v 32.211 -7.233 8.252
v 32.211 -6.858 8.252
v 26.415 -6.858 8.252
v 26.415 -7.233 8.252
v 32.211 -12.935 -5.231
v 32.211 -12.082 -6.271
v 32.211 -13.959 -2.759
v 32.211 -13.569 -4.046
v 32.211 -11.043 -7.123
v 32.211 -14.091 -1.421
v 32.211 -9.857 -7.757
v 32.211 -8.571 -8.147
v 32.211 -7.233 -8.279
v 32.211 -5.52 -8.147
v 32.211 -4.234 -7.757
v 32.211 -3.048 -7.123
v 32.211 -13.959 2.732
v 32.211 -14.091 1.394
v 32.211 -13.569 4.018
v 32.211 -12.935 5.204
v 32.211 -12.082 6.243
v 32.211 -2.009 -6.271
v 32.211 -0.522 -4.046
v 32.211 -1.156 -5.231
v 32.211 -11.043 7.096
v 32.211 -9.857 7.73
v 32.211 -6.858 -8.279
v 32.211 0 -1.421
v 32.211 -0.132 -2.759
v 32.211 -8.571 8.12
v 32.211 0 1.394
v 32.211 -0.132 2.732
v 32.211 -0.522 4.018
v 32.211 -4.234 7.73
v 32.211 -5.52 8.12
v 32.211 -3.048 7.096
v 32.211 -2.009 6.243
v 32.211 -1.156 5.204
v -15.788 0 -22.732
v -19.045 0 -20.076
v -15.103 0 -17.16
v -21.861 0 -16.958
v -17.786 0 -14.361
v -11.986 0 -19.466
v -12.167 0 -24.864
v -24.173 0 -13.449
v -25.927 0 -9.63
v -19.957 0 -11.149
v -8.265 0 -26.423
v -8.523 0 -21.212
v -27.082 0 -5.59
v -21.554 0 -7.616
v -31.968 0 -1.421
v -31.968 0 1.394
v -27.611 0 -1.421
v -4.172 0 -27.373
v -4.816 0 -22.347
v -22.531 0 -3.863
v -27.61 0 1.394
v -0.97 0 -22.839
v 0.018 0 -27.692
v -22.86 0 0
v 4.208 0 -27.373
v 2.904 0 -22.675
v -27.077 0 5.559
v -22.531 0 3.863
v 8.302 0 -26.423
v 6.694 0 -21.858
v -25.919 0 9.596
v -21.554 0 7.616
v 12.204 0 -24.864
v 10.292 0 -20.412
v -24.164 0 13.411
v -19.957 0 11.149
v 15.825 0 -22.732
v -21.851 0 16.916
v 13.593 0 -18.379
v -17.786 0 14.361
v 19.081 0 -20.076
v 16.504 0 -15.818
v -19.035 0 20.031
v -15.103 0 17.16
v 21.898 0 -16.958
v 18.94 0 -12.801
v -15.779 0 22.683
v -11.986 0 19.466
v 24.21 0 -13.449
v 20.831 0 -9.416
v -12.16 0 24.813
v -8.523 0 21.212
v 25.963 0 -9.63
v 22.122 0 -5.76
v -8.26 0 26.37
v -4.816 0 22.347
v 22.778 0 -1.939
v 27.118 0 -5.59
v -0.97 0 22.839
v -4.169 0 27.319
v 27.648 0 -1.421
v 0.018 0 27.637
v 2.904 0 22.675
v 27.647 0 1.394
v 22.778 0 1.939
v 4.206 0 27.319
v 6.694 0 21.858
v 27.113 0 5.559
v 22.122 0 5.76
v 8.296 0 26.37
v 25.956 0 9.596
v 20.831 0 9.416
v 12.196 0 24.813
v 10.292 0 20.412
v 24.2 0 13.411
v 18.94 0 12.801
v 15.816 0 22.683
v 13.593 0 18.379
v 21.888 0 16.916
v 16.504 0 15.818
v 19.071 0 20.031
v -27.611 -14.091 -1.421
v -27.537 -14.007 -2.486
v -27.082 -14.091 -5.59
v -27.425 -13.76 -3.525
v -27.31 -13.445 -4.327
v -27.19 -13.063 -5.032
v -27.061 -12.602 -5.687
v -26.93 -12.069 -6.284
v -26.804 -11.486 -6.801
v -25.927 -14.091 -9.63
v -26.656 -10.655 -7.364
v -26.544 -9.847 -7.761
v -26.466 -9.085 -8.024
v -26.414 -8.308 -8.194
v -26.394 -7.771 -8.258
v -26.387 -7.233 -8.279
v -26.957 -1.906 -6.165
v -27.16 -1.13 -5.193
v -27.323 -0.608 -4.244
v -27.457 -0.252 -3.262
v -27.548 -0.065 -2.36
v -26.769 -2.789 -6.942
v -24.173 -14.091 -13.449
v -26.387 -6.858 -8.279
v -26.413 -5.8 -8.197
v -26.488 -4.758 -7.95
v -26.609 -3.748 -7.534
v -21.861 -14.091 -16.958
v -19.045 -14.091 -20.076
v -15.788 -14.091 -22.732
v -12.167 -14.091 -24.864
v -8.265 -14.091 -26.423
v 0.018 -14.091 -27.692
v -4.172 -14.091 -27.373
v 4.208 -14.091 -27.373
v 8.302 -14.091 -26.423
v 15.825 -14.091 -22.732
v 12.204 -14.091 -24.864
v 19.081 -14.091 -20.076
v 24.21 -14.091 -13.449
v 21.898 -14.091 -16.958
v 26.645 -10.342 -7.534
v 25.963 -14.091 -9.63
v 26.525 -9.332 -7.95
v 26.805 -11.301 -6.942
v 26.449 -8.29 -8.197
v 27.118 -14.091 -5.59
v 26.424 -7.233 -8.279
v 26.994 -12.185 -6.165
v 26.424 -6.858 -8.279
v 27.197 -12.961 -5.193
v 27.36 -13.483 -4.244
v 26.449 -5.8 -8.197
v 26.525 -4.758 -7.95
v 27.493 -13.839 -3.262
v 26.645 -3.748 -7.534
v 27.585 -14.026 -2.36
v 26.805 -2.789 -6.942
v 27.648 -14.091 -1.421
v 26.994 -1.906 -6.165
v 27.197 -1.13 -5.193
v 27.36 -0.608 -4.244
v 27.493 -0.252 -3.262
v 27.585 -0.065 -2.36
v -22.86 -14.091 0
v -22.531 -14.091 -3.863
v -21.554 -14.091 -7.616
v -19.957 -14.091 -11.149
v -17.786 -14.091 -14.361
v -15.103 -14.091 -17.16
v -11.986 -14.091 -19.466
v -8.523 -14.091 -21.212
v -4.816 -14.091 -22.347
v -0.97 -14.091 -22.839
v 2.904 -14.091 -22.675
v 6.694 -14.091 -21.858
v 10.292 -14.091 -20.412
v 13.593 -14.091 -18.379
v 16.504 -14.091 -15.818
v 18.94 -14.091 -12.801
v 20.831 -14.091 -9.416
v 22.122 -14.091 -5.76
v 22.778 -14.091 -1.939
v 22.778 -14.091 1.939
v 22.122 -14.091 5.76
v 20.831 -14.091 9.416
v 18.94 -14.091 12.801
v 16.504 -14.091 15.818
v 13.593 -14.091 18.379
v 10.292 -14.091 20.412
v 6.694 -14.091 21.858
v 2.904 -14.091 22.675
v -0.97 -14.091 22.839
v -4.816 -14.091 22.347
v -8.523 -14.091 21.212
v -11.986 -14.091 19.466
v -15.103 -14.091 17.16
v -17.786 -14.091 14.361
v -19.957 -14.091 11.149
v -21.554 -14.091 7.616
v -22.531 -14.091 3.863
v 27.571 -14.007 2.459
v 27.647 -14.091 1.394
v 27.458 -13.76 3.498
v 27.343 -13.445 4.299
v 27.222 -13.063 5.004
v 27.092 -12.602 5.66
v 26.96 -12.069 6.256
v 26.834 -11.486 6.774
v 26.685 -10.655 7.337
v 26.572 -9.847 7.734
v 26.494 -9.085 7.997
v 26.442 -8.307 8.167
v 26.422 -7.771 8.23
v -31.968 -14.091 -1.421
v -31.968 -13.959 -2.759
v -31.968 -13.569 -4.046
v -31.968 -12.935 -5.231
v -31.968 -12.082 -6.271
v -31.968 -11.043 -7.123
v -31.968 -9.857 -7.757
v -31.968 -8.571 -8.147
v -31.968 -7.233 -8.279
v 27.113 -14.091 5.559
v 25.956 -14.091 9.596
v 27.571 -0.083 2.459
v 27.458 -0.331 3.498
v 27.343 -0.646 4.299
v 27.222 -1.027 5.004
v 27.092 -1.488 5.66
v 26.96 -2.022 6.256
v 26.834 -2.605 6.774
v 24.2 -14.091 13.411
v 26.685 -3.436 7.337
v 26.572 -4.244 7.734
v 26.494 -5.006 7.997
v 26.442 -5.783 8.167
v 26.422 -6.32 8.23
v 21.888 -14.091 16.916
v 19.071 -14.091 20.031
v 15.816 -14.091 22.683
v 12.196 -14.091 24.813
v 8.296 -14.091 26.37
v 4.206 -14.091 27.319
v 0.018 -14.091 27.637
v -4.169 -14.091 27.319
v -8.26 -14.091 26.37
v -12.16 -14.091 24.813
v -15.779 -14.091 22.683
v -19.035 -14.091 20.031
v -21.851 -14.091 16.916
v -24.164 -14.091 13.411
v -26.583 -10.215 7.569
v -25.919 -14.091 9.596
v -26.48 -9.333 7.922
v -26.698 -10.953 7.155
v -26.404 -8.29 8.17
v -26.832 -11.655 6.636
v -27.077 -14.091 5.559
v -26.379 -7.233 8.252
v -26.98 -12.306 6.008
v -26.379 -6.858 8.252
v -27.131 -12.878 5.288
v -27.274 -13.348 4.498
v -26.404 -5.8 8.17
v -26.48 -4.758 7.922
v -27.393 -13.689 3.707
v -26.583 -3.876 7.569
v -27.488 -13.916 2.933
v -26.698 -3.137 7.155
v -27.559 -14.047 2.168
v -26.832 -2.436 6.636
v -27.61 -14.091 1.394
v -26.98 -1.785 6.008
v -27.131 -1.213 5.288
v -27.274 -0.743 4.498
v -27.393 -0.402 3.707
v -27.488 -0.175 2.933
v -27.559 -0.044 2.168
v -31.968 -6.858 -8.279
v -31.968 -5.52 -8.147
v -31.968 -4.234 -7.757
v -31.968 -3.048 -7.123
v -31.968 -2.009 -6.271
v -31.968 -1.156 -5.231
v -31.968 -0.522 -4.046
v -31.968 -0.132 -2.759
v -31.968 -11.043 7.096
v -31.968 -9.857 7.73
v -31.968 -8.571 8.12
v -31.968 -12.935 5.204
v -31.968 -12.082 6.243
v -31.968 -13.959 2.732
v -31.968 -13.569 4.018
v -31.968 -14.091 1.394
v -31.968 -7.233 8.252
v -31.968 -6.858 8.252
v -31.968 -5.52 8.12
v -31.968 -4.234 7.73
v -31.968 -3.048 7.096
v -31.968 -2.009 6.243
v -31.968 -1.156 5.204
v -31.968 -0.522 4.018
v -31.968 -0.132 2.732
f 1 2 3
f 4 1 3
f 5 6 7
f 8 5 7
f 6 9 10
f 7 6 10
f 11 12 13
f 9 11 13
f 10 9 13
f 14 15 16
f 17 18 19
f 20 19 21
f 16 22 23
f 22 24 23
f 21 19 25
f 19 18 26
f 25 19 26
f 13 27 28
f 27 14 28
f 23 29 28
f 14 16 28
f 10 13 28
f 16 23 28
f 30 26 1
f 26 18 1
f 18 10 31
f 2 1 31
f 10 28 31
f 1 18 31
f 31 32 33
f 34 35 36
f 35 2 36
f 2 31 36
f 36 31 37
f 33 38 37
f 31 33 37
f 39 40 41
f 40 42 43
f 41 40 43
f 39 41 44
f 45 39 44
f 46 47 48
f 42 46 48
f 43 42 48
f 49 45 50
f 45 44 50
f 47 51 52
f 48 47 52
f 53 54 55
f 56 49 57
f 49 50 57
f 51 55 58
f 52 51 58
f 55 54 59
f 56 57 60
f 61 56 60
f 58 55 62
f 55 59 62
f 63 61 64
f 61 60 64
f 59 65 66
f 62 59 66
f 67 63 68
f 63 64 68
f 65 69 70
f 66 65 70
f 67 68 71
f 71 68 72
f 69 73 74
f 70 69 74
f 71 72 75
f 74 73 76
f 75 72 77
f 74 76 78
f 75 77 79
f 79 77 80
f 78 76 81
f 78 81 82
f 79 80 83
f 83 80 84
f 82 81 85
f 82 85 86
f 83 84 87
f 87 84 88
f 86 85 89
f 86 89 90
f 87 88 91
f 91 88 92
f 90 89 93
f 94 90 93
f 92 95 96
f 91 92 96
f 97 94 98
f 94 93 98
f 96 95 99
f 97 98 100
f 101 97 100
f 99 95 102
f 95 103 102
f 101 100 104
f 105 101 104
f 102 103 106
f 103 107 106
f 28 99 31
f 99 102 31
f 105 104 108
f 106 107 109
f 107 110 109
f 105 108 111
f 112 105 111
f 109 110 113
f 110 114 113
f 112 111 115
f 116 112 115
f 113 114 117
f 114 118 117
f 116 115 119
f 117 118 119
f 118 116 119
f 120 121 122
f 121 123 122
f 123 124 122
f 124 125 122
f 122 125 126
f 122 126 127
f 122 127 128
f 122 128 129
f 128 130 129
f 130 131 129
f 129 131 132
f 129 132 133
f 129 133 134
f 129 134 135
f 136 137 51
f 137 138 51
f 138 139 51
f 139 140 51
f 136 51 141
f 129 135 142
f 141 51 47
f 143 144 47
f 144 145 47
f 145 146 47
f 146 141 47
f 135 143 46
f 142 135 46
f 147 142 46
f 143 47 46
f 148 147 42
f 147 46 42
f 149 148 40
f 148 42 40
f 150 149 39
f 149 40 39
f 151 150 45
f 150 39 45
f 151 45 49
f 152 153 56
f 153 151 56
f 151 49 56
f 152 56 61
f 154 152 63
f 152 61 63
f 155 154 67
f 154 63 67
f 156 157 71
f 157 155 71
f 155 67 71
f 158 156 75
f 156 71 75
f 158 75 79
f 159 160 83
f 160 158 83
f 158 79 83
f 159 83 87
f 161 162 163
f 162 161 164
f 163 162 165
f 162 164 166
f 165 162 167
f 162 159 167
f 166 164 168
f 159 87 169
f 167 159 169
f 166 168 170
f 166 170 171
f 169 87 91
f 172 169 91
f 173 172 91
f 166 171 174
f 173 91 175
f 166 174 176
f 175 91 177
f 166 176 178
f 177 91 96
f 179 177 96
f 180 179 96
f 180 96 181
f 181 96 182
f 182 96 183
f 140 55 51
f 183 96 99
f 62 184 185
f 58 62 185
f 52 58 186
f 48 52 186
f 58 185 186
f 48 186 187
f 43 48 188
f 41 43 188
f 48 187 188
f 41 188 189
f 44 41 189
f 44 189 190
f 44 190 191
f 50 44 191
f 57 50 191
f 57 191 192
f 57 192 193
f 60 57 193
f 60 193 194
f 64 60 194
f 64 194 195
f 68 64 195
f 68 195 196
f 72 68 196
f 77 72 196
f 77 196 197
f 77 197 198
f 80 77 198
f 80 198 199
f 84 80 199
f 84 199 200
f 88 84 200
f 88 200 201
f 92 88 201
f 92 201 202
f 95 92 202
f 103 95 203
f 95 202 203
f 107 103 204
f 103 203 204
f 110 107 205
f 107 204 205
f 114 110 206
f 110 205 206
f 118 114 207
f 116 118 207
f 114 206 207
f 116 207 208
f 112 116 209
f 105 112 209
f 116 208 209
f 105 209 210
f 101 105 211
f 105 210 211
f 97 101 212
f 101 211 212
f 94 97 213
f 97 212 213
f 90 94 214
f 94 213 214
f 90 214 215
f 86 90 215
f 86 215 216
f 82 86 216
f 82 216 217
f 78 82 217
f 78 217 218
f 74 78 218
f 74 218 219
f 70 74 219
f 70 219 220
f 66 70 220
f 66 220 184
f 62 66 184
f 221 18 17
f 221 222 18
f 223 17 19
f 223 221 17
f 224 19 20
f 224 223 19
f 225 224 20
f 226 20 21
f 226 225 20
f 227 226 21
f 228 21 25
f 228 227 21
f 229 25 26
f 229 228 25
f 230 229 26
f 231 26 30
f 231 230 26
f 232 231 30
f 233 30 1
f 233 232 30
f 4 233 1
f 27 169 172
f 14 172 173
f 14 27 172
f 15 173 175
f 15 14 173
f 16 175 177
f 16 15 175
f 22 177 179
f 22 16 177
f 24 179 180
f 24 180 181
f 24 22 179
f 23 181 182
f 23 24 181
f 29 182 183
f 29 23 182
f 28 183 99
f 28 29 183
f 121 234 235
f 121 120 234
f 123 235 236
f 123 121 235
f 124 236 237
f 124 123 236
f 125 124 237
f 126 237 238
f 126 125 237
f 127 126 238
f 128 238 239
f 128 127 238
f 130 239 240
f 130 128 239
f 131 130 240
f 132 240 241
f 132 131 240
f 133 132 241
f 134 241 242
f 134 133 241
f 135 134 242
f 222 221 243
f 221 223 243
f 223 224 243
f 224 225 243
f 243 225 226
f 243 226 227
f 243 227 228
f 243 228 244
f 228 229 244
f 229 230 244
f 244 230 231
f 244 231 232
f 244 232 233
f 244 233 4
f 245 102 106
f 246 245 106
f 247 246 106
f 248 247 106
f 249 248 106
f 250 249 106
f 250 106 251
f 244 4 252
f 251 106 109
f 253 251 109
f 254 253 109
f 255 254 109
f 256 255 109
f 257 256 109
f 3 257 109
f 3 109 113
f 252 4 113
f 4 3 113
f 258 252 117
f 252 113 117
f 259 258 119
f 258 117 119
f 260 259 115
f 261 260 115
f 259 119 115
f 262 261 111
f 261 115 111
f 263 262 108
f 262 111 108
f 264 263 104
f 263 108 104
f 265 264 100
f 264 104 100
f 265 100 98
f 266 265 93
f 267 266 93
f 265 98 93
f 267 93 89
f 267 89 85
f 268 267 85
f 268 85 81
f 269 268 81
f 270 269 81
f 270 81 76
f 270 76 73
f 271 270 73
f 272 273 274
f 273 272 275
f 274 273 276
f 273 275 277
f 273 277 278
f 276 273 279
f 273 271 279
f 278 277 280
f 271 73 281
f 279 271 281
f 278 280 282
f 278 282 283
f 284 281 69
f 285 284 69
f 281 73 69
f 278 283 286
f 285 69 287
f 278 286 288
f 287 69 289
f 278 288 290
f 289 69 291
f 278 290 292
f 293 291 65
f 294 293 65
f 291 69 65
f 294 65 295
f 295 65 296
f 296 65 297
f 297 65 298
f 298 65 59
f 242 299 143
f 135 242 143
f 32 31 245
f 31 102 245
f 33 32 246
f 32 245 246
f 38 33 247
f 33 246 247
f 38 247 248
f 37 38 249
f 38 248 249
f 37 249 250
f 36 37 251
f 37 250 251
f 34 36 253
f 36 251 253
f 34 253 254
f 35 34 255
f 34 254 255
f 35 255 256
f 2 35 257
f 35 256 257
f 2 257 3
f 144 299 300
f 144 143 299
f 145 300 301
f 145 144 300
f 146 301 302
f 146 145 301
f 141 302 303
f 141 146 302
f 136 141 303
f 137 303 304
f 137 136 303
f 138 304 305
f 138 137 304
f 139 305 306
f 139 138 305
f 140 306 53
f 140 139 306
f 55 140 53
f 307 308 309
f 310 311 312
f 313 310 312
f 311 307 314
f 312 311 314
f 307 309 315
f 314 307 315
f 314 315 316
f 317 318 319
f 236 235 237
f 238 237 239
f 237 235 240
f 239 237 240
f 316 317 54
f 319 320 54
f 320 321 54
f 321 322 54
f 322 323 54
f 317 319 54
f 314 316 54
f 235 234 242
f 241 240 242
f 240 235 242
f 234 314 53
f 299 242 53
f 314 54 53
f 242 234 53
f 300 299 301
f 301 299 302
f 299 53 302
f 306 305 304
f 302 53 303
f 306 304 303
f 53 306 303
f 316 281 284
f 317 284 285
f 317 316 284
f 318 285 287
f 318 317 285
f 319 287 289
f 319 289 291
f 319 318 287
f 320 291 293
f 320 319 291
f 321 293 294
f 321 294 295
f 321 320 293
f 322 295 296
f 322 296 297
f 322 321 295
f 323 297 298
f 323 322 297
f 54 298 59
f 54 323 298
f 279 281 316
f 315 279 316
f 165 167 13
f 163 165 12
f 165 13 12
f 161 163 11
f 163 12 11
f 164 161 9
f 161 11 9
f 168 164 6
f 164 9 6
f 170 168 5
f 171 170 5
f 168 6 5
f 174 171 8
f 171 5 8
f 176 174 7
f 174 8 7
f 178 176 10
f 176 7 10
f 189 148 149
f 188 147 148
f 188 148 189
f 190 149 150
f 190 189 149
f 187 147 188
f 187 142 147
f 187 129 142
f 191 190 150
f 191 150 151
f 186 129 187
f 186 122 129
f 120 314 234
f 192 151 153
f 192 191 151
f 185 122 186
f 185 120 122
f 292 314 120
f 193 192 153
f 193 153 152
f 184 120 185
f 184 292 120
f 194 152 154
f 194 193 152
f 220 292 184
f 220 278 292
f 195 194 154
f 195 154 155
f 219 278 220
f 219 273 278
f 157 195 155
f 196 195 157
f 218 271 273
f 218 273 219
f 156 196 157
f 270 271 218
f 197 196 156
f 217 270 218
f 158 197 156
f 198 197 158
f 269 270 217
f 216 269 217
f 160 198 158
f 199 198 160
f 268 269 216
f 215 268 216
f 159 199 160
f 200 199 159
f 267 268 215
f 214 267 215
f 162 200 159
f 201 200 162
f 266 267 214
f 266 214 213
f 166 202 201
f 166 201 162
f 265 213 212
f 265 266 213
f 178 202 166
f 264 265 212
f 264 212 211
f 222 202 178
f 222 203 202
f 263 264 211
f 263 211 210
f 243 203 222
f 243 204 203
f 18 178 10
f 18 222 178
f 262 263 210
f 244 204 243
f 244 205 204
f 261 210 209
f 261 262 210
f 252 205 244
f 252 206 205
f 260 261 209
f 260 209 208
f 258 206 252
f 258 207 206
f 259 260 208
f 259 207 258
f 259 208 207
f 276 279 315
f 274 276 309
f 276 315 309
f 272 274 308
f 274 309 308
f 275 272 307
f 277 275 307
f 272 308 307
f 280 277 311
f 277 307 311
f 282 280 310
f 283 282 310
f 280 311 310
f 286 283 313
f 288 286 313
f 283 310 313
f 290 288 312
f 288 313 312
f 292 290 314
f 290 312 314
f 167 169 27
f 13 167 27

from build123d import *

# Parameters (mm, degrees)
F1_DEPTH = 14.0906665474
F3_D     = 45.72
F4_R     = 6.858
F5_R     = 6.858


with BuildPart() as f1:
    # F0 (on Front) → F1 (new body)
    with BuildSketch(Plane.XZ):
        with BuildLine():
            ThreePointArc((26.423855446, -8.2792220637), (27.3665356573, -4.201095127), (27.6831785203, -0.0274273648))
            ThreePointArc((27.6831785203, -0.0274273648), (27.364375928, 4.1603676932), (26.4153157441, 8.251644671))
            Line((26.4153157441, 8.251644671), (-26.3786924152, 8.251644671))
            ThreePointArc((-26.3786924152, 8.251644671), (-27.6465515, -0.0131359372), (-26.3872321171, -8.2792220637))
            Line((-26.3872321171, -8.2792220637), (26.423855446, -8.2792220637))
        make_face()
        with BuildLine():
            ThreePointArc((26.4153157441, 8.251644671), (27.364375928, 4.1603676932), (27.6831785203, -0.0274273648))
            ThreePointArc((27.6831785203, -0.0274273648), (27.3665356573, -4.201095127), (26.423855446, -8.2792220637))
            Line((26.423855446, -8.2792220637), (32.2108827531, -8.2792220637))
            Line((32.2108827531, -8.2792220637), (32.2108827531, 8.251644671))
            Line((32.2108827531, 8.251644671), (26.4153157441, 8.251644671))
        make_face()
        with BuildLine():
            Line((-26.3786924152, 8.251644671), (26.4153157441, 8.251644671))
            ThreePointArc((26.4153157441, 8.251644671), (0.0183116645, 27.6374394911), (-26.3786924152, 8.251644671))
        make_face()
        with BuildLine():
            ThreePointArc((-26.3872321171, -8.2792220637), (0.0183116645, -27.6922942207), (26.423855446, -8.2792220637))
            Line((26.423855446, -8.2792220637), (-26.3872321171, -8.2792220637))
        make_face()
        with BuildLine():
            ThreePointArc((-26.3872321171, -8.2792220637), (-27.6465515, -0.0131359372), (-26.3786924152, 8.251644671))
            Line((-26.3786924152, 8.251644671), (-31.9677777588, 8.251644671))
            Line((-31.9677777588, 8.251644671), (-31.9677777588, -8.2792220637))
            Line((-31.9677777588, -8.2792220637), (-26.3872321171, -8.2792220637))
        make_face()
    extrude(amount=F1_DEPTH)

    # F3 (through all)
    with Locations(Plane(origin=(0, 0, 0), x_dir=(1, 0, 0), z_dir=(0, 1, 0))):
        with Locations((0, 0)):
            Hole(F3_D / 2)

    # F4
    f4_edges = [f1.edges().sort_by_distance(p)[0] for p in [
        (29.317369, -14.090667, -8.279222),
        (29.317369, 0, -8.279222),
        (29.313099, -14.090667, 8.251645),
        (29.313099, 0, 8.251645),
    ]]
    fillet(f4_edges, radius=F4_R)

    # F5
    f5_edges = [f1.edges().sort_by_distance(p)[0] for p in [
        (-29.177505, -14.090667, -8.279222),
        (-29.173235, -14.090667, 8.251645),
        (-29.173235, 0, 8.251645),
        (-29.177505, 0, -8.279222),
    ]]
    fillet(f5_edges, radius=F5_R)


solid = f1.part
